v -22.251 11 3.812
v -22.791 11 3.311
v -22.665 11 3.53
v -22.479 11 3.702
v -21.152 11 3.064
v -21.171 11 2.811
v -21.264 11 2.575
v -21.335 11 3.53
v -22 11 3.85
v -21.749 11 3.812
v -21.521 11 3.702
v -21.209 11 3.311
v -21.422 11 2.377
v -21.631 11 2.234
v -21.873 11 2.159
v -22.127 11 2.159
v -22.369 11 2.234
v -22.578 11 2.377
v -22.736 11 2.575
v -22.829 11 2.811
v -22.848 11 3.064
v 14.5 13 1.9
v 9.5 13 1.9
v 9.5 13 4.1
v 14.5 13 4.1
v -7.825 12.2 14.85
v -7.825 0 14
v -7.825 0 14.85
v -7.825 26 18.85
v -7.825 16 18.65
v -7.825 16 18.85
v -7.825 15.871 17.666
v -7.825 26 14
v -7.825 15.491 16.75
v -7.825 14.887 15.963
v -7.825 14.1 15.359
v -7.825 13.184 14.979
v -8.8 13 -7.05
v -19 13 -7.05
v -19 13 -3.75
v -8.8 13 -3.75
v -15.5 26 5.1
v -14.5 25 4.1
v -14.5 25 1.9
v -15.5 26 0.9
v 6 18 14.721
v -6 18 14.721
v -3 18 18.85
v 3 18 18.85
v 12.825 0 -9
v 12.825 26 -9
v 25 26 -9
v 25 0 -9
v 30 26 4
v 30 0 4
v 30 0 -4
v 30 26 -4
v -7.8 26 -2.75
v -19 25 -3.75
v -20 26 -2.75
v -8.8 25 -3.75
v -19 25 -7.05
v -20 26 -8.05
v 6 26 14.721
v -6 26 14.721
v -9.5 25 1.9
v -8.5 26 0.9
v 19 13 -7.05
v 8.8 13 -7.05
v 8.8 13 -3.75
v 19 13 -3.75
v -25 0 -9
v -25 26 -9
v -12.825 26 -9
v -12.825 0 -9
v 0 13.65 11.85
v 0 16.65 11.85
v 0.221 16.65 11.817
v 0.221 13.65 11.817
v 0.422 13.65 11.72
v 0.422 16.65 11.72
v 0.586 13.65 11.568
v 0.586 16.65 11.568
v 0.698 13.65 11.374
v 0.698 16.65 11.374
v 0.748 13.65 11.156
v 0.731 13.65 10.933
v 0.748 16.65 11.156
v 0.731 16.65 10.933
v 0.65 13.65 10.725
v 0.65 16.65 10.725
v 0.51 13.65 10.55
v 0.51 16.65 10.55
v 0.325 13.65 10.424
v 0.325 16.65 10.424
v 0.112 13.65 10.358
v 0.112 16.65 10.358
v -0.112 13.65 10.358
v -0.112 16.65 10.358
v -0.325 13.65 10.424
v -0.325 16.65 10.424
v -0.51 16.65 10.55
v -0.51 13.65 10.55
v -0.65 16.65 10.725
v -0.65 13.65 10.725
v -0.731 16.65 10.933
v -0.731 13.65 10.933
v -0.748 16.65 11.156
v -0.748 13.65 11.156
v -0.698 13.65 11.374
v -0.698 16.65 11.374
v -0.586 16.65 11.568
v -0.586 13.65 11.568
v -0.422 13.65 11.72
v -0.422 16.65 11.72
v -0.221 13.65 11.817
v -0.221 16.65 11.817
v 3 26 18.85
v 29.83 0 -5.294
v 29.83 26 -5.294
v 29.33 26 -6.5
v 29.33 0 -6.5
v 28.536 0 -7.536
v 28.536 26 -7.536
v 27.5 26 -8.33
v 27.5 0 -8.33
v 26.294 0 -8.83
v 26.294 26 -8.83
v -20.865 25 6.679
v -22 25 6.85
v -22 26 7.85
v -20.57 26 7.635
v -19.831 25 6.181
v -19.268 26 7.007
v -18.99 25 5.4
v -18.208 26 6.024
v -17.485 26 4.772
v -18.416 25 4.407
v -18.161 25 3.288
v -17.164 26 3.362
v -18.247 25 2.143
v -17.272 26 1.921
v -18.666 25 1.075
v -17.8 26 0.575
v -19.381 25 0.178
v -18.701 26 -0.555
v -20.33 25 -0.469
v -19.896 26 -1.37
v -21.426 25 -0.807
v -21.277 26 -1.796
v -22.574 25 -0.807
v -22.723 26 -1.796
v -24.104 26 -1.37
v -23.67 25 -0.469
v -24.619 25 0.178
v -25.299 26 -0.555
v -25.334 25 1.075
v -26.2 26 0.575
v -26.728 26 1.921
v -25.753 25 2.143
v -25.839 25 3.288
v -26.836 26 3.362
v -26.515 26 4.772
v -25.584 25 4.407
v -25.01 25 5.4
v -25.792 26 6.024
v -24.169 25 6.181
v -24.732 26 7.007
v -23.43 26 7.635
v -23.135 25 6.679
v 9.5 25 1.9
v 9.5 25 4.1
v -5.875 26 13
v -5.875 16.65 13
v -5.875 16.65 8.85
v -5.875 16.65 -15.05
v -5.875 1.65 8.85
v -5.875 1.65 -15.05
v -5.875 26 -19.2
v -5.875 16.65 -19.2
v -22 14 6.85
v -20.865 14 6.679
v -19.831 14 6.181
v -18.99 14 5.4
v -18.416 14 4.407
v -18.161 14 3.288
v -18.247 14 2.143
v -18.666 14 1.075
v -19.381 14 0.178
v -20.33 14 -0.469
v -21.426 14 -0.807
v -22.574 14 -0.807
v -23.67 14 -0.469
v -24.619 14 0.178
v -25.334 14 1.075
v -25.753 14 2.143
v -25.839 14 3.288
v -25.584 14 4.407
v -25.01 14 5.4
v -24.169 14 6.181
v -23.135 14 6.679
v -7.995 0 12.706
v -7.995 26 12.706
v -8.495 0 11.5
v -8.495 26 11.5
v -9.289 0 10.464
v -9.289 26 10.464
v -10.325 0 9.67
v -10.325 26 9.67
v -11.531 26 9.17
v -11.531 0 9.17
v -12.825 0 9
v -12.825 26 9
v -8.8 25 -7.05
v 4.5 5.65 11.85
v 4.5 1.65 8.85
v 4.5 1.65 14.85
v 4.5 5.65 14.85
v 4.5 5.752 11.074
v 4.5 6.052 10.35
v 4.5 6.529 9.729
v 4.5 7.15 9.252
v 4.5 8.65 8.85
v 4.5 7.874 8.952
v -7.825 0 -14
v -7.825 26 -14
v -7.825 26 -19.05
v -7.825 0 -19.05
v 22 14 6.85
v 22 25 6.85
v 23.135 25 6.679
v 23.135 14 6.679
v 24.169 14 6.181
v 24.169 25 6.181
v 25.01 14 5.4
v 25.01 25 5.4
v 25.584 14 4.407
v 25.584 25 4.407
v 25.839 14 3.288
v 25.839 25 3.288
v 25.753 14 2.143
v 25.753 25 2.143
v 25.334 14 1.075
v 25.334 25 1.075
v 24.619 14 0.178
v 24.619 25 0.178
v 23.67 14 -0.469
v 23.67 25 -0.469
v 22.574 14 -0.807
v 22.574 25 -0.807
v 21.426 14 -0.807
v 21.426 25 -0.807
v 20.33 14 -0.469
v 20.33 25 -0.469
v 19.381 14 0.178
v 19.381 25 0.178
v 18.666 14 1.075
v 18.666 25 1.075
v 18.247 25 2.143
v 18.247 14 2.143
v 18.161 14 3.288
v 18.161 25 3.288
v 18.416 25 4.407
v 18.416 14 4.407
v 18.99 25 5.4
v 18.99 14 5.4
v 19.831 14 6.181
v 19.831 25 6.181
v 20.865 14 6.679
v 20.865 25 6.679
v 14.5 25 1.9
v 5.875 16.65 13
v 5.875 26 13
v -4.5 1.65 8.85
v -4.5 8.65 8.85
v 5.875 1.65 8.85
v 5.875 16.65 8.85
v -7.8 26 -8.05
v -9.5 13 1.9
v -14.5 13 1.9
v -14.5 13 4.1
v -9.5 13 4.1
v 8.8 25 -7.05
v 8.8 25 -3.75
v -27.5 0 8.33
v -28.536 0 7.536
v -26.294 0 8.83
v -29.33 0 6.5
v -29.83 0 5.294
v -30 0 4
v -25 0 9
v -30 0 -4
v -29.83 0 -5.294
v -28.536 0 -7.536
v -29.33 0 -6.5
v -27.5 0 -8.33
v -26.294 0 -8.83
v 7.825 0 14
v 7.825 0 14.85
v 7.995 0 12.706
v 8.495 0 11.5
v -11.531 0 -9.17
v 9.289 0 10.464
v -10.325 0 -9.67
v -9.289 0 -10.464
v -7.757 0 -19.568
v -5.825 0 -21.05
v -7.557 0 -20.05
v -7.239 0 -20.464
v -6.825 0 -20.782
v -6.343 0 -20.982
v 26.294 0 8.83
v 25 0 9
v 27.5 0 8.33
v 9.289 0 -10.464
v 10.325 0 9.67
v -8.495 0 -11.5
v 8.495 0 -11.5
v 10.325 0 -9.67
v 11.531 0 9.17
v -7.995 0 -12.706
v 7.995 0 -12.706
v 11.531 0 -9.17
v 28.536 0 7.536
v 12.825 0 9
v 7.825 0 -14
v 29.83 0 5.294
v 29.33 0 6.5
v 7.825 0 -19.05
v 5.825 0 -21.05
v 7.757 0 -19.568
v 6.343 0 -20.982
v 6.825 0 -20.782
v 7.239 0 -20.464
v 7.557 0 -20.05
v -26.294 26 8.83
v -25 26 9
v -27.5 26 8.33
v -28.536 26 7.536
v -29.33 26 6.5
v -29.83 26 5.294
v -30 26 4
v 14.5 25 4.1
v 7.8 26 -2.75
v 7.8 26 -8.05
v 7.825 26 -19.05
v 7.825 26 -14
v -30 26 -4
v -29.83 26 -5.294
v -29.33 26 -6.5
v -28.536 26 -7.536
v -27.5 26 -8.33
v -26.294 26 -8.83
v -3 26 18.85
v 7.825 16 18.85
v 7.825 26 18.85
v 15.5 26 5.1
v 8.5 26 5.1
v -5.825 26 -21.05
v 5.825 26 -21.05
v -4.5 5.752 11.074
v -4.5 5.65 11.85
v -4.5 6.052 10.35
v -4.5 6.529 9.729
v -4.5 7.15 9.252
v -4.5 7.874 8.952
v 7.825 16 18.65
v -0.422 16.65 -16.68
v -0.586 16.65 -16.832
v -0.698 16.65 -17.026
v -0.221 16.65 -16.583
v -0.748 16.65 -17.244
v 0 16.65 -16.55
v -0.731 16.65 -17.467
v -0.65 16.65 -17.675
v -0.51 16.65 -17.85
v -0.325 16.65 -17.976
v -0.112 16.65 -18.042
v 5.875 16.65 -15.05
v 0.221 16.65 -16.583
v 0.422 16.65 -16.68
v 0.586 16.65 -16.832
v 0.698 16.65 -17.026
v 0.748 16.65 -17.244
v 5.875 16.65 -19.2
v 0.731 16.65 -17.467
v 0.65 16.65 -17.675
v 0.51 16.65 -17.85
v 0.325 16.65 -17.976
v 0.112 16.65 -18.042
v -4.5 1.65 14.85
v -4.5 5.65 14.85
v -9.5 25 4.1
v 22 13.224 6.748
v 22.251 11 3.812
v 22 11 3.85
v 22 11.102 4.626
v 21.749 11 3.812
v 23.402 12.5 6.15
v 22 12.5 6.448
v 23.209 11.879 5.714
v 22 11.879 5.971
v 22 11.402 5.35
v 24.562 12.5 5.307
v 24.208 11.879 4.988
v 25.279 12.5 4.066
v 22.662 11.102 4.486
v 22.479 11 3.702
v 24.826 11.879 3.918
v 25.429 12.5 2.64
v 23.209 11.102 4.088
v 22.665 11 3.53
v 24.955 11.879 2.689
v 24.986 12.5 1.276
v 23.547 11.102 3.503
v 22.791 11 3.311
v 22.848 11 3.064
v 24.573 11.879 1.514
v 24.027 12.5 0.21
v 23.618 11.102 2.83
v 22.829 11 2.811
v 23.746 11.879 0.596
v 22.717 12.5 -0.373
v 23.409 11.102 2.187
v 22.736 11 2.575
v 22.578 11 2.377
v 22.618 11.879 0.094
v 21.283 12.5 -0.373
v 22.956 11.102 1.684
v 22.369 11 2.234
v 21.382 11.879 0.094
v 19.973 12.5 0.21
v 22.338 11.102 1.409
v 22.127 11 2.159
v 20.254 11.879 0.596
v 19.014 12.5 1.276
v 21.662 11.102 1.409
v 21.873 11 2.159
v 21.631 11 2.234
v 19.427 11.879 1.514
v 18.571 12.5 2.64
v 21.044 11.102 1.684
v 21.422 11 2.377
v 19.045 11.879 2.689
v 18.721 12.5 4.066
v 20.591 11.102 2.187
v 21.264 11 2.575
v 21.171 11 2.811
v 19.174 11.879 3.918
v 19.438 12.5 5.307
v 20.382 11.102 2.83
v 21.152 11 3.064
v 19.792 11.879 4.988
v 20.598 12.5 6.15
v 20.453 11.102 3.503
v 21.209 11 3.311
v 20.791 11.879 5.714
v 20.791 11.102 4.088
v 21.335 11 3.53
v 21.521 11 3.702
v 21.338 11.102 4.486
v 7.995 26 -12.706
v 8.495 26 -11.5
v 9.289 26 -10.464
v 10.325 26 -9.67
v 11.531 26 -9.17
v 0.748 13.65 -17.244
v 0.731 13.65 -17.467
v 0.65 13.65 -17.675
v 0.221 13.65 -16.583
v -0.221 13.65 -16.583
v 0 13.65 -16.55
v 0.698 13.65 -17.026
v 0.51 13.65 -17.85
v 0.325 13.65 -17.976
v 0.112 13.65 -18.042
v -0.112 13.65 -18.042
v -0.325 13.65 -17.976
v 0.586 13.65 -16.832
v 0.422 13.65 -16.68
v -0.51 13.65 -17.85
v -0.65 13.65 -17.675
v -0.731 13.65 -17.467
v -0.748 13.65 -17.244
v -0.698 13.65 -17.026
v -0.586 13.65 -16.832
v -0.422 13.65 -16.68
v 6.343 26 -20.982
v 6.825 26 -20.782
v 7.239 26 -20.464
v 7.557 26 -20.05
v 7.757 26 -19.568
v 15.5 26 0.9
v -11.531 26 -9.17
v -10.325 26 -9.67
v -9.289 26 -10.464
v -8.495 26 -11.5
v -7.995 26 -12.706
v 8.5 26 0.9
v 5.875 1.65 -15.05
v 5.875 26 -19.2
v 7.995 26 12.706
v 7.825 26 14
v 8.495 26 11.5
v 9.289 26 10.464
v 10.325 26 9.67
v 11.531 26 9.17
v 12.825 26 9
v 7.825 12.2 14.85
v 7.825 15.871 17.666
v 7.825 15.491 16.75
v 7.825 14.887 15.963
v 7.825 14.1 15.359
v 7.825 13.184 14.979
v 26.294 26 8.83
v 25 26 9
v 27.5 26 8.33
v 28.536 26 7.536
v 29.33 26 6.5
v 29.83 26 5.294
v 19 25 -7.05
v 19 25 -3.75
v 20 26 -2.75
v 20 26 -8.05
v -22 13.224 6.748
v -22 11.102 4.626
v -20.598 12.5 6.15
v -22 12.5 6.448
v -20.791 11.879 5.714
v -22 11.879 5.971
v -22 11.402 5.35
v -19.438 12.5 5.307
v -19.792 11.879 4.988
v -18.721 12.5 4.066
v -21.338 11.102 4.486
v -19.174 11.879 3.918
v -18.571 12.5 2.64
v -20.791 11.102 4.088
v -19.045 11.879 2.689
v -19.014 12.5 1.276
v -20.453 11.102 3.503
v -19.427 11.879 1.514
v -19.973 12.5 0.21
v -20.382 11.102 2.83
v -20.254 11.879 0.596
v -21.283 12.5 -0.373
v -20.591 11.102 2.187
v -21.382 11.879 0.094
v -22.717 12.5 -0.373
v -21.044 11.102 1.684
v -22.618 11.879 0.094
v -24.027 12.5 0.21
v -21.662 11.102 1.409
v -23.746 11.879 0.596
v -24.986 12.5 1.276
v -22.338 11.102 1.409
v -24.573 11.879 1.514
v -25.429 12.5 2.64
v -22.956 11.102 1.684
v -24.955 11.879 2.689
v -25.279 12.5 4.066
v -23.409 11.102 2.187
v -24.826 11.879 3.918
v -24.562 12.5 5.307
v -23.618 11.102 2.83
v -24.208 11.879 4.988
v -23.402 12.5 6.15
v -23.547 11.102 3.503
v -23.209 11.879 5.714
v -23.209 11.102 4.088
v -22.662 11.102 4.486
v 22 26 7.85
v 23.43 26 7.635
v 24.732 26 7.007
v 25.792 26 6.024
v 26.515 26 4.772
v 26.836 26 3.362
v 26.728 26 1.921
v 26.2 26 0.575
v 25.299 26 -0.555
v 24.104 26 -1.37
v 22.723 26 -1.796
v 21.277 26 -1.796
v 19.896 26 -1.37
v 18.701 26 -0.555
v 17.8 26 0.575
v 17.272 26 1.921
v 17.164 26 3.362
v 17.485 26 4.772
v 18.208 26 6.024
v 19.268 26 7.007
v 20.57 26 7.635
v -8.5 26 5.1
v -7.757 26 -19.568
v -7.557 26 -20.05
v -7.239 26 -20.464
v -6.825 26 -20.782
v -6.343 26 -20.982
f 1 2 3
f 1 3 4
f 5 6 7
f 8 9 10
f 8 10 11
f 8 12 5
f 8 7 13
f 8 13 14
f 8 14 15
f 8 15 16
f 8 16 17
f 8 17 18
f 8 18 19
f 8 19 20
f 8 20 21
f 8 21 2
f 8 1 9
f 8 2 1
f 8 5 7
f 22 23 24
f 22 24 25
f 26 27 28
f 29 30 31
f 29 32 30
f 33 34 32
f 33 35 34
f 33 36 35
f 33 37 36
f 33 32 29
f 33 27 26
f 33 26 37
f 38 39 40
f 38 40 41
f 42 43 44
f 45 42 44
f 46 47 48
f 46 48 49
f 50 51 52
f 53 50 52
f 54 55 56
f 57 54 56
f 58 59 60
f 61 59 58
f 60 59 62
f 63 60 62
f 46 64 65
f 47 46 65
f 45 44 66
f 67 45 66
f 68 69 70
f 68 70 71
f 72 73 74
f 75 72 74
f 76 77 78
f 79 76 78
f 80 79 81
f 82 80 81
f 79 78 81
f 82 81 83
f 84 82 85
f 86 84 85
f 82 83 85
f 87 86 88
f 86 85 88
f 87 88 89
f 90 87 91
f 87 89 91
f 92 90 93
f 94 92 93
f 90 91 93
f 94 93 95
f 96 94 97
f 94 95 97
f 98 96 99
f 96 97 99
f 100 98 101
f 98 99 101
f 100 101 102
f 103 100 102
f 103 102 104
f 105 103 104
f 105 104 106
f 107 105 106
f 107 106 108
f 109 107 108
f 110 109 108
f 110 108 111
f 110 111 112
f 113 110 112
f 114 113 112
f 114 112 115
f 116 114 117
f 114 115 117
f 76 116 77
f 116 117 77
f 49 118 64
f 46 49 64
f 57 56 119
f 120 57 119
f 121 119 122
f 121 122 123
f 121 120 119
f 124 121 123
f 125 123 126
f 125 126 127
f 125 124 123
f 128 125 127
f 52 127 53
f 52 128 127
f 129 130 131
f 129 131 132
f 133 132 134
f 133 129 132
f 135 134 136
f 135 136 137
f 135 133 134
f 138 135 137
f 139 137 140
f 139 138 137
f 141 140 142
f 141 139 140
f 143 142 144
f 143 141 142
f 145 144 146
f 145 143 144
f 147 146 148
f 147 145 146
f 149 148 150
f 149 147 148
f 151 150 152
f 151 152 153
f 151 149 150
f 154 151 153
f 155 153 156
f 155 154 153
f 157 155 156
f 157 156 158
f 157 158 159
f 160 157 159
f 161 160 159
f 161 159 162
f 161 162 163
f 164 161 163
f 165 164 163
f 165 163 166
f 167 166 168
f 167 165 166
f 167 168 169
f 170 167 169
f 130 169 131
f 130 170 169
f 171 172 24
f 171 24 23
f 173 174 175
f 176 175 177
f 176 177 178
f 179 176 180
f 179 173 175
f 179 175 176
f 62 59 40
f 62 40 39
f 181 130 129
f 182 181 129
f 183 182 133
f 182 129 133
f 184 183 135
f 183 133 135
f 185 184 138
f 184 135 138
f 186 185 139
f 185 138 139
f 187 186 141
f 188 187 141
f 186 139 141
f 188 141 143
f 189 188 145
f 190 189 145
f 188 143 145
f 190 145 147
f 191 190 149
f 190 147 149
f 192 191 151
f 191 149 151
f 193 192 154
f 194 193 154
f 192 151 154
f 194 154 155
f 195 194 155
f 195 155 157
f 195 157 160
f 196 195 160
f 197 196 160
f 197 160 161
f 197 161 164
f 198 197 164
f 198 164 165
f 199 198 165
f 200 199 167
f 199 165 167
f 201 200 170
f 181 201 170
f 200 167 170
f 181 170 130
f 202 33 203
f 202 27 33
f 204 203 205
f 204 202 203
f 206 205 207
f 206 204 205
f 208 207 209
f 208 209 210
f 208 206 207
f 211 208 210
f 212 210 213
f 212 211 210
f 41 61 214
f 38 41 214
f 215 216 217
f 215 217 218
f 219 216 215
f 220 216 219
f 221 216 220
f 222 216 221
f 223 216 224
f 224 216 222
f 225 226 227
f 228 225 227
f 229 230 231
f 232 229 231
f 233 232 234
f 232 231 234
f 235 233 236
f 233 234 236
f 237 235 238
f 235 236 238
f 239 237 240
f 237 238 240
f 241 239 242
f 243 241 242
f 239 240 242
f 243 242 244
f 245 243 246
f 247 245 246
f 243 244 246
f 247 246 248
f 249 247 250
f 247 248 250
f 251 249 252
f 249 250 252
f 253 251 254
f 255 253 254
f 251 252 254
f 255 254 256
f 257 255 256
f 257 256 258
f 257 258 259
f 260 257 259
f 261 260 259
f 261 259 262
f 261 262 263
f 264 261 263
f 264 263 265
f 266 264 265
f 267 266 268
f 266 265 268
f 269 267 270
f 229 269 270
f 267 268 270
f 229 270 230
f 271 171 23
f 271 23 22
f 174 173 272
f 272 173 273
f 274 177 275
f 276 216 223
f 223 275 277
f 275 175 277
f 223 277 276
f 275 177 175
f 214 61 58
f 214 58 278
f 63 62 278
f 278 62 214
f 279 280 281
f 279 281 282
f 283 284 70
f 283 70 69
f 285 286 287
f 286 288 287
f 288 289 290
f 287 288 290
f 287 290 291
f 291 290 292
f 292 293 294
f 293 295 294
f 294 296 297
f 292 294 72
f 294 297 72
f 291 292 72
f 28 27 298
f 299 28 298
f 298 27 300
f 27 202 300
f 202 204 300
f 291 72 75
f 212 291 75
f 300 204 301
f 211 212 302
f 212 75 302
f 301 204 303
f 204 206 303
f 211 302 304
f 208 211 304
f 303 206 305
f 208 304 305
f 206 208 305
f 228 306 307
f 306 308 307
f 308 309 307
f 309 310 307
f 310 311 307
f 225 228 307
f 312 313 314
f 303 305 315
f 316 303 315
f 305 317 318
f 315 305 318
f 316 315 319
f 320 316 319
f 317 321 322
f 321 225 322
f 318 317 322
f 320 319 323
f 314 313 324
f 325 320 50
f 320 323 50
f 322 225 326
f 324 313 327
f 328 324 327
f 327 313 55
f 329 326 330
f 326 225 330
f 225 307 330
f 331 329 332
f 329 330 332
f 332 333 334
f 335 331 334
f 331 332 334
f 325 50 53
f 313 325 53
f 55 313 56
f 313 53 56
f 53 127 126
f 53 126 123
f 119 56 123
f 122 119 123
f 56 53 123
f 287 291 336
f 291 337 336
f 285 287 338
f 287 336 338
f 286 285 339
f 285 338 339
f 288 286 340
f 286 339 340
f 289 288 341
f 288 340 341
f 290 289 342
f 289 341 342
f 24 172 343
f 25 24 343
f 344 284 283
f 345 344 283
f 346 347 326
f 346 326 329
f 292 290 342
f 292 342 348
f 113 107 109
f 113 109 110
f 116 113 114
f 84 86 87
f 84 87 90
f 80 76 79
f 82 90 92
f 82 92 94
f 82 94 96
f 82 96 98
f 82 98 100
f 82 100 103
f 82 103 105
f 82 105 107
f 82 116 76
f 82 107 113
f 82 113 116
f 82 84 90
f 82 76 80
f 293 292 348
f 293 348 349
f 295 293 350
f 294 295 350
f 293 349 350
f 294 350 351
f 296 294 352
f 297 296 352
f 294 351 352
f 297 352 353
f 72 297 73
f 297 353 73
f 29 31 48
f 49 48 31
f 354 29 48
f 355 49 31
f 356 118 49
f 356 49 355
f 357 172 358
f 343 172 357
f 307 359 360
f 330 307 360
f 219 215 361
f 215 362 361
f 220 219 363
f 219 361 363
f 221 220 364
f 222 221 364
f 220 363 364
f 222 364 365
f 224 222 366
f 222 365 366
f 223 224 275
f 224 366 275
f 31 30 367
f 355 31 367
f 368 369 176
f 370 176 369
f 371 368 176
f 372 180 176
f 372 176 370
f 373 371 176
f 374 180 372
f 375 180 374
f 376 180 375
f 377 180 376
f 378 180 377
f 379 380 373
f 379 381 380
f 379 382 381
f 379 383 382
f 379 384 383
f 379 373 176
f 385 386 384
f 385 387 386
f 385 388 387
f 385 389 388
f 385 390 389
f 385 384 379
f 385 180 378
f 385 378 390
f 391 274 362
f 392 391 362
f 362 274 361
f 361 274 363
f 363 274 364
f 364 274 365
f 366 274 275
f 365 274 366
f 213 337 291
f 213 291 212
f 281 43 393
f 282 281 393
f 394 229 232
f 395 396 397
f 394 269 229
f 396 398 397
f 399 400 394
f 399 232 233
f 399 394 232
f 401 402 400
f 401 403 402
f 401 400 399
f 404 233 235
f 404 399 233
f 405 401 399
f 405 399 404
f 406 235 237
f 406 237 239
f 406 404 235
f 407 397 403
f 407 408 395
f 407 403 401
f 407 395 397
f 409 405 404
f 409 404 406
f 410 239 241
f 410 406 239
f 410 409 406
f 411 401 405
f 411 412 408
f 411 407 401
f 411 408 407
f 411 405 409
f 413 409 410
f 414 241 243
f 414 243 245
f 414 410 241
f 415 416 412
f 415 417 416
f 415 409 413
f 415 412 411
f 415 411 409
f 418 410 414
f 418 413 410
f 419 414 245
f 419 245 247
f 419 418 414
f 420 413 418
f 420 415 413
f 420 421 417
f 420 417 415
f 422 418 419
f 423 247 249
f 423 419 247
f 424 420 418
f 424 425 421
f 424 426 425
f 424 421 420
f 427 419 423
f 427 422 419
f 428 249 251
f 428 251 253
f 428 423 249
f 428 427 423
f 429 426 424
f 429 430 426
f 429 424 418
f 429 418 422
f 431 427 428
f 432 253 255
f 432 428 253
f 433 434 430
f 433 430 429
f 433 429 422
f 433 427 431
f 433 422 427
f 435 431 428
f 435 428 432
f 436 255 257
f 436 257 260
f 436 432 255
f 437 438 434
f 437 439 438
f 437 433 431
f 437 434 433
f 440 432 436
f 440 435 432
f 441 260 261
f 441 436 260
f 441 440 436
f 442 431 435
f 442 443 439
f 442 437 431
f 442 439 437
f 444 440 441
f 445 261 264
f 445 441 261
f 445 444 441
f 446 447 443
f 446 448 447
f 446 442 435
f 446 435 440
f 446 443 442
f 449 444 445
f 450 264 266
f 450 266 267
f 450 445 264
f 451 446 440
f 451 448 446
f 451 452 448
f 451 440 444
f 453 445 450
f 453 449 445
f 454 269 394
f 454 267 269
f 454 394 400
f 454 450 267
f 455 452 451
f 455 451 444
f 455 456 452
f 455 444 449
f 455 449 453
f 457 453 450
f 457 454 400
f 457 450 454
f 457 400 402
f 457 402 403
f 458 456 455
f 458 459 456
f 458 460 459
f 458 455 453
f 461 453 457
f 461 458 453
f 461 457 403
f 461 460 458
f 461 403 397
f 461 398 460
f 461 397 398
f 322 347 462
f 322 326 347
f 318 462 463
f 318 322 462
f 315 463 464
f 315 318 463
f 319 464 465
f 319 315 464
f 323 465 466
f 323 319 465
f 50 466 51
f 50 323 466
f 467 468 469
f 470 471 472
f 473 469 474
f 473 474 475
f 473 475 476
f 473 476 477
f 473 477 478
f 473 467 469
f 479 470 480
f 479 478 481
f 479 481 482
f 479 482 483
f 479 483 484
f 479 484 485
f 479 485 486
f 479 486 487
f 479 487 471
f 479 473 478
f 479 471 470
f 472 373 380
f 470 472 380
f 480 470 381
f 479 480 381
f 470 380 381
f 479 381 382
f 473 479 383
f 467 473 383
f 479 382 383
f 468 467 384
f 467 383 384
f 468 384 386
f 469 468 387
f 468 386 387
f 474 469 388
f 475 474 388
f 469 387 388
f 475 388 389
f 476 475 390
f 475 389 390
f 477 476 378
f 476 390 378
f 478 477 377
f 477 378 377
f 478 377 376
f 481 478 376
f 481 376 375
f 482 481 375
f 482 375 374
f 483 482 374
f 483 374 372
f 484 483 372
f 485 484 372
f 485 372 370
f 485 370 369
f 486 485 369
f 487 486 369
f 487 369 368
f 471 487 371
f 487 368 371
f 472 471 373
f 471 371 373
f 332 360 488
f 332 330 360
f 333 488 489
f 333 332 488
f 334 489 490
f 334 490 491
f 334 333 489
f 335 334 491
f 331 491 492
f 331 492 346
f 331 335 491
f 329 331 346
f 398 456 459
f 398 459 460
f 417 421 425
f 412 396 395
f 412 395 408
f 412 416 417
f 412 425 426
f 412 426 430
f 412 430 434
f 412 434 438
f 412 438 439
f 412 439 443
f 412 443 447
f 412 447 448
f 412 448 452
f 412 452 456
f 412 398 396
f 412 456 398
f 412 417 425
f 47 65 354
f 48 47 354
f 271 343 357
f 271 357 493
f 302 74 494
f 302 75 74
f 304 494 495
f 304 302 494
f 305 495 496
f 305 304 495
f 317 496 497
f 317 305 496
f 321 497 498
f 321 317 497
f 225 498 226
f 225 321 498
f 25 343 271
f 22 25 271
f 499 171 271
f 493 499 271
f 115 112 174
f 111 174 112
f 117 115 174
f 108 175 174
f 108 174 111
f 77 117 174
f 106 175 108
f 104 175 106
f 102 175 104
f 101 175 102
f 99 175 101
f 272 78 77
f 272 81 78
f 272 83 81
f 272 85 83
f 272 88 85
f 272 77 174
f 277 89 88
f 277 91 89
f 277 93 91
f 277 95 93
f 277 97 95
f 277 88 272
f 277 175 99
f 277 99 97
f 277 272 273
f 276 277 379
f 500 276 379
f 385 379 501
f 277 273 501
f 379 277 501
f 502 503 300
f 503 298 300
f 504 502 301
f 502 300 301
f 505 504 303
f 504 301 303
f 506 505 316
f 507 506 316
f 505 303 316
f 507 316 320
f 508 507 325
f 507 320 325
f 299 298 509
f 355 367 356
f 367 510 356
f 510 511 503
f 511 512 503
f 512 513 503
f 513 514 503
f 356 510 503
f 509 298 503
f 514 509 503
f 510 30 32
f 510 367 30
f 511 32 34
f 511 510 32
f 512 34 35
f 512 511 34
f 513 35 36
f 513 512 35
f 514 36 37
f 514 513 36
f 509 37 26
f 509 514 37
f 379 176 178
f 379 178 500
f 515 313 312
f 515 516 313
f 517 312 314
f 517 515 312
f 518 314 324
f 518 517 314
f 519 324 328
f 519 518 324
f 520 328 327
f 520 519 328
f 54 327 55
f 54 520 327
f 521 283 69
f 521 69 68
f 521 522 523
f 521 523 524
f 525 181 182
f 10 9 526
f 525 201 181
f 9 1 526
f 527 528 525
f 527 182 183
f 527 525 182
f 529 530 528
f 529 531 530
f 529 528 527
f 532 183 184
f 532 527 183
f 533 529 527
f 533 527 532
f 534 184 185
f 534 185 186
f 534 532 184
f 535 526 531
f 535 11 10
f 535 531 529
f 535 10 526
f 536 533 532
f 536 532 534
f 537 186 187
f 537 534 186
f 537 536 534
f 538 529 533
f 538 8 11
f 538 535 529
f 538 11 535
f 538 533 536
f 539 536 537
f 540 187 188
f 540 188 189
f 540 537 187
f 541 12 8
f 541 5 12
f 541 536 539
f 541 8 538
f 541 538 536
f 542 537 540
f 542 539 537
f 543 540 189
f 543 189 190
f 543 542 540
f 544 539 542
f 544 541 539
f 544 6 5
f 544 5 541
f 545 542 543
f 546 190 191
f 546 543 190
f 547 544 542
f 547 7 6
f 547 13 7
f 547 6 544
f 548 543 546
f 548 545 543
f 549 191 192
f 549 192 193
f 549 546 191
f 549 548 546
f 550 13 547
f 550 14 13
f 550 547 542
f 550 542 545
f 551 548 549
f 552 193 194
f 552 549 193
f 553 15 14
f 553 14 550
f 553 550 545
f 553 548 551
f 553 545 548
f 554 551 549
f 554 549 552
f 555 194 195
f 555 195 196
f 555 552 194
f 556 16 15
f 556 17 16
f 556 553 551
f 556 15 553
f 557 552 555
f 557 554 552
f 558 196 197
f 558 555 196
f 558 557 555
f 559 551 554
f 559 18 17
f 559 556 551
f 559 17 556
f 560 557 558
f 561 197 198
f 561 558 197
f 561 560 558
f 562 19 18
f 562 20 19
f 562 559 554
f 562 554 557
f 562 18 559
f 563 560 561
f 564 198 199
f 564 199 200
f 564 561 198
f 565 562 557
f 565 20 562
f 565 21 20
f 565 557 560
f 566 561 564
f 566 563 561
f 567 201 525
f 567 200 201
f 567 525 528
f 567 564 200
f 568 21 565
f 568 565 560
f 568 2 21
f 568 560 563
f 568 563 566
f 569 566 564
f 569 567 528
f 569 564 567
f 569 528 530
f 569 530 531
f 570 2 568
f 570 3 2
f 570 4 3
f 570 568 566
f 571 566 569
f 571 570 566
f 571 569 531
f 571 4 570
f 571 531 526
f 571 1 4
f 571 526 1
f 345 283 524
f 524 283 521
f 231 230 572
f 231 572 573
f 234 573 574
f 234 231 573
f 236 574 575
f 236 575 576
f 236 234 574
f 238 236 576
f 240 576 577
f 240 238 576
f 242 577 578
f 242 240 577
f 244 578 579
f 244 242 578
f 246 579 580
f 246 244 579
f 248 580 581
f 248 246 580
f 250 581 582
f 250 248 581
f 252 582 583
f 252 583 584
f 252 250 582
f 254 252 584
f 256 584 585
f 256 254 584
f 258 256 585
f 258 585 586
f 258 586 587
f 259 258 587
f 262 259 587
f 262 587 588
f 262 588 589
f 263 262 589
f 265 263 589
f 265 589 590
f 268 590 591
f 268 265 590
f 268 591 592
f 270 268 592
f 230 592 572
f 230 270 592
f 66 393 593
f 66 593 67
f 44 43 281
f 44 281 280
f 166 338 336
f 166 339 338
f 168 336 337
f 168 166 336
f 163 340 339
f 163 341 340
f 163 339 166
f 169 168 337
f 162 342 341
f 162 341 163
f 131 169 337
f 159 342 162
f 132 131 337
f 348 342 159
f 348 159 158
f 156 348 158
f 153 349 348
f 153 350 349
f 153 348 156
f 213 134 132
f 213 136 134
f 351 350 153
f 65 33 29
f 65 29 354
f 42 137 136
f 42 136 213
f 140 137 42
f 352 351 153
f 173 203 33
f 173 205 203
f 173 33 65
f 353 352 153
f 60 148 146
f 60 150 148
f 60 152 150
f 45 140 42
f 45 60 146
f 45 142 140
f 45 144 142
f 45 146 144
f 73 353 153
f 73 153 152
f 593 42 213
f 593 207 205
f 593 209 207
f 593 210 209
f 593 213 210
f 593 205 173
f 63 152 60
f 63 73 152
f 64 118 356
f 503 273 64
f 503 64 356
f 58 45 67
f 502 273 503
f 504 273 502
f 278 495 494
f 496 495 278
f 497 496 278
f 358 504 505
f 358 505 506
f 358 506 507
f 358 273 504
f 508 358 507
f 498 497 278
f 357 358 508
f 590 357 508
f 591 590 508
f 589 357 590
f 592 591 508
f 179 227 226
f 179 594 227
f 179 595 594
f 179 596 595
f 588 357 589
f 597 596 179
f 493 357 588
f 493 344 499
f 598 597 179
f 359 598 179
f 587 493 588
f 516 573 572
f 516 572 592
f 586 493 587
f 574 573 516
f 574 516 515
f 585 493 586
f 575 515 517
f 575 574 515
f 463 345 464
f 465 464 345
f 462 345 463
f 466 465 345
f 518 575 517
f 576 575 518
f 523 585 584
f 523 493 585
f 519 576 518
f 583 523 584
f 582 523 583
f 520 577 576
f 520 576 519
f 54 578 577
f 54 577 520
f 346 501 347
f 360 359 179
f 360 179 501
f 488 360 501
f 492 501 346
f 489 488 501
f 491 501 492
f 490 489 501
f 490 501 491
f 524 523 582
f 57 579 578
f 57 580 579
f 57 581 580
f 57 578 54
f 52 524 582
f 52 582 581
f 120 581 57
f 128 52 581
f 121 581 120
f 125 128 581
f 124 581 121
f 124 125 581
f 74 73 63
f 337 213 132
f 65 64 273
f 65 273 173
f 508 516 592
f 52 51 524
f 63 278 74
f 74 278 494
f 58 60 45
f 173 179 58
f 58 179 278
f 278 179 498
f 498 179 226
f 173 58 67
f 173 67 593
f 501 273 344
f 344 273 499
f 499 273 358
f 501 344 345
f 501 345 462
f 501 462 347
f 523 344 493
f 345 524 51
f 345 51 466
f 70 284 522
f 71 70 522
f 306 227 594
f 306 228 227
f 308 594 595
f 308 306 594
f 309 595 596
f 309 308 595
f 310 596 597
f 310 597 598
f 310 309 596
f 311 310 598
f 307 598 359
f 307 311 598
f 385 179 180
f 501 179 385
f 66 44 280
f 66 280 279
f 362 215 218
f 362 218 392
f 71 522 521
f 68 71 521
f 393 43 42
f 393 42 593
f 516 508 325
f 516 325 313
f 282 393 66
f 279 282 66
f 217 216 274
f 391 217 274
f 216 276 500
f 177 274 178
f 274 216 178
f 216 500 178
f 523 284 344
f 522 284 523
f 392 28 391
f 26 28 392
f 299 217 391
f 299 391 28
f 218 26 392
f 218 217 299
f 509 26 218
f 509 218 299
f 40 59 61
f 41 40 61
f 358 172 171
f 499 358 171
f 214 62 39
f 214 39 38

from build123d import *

# Parameters (mm, degrees)
SKETCH1_W             = 60
SKETCH1_H             = 18
BOSS_EXTRUDE1_DEPTH   = 26
SKETCH2_R             = 3.85
EYESHAFT_HOLES_DEPTH  = 15
EYESHAFT_FILLET_R     = 3
SKETCH5_W             = 5
SKETCH5_H             = 2.2
FRONT_LEG_HOLES_DEPTH = 13
SKETCH7_W             = 10.2
SKETCH7_H             = 3.3
BACK_LEGS_DEPTH       = 13
SKETCH18_W            = 15.65
SKETCH18_H            = 35.9
SERVO_BLOCK_DEPTH     = 26
SKETCH19_W            = 11.75
SKETCH19_H            = 32.2
SERVO_ARMS_DEPTH      = 9.35
SKETCH20_W            = 11.75
SKETCH20_H            = 23.9
CUT_EXTRUDE10_DEPTH   = 15
FILLET4_R             = 5
CHAMFER1_SIZE         = 1
SKETCH21_W            = 9
SKETCH21_H            = 4
CUT_EXTRUDE11_DEPTH   = 15
FILLET5_R             = 3
SKETCH22_R            = 0.75
CUT_EXTRUDE12_DEPTH   = 3
FILLET6_R             = 5
SKETCH23_W            = 15.65
SKETCH23_H            = 10
BOSS_EXTRUDE3_DEPTH   = 4
DOVE_TAIL_DEPTH       = 8
FILLET8_R             = 3.8
FILLET9_R             = 2


with BuildPart() as part:
    # Sketch1 → Boss-Extrude1 (new body)
    with BuildSketch(Plane(origin=(0, 0, 0), x_dir=(1, 0, 0), z_dir=(0, 1, 0))):
        Rectangle(SKETCH1_W, SKETCH1_H)
    extrude(amount=BOSS_EXTRUDE1_DEPTH)

    # Sketch2 → Eyeshaft holes (cut)
    with BuildSketch(Plane(origin=(0, 26, 0), x_dir=(1, 0, 0), z_dir=(0, 1, 0))):
        with Locations(Location((-22, -3, 0), (0, 0, 270))):
            Circle(SKETCH2_R)
        with Locations(Location((22, -3, 0), (0, 0, 270))):
            Circle(SKETCH2_R)
    extrude(amount=-EYESHAFT_HOLES_DEPTH, mode=Mode.SUBTRACT)

    # Eyeshaft Fillet
    eyeshaft_fillet_edges = [part.edges().sort_by_distance(p)[0] for p in [
        (-22, 11, -0.85),
        (22, 11, -0.85),
    ]]
    fillet(eyeshaft_fillet_edges, radius=EYESHAFT_FILLET_R)

    # Sketch5 → Front leg holes (cut)
    with BuildSketch(Plane(origin=(0, 26, 0), x_dir=(1, 0, 0), z_dir=(0, 1, 0))):
        with Locations((-12, -3)):
            Rectangle(SKETCH5_W, SKETCH5_H)
        with Locations((12, -3)):
            Rectangle(SKETCH5_W, SKETCH5_H)
    extrude(amount=-FRONT_LEG_HOLES_DEPTH, mode=Mode.SUBTRACT)

    # Sketch7 → Back Legs (cut)
    with BuildSketch(Plane(origin=(0, 26, 0), x_dir=(1, 0, 0), z_dir=(0, 1, 0))):
        with Locations((-13.9, 5.4)):
            Rectangle(SKETCH7_W, SKETCH7_H)
        with Locations((13.9, 5.4)):
            Rectangle(SKETCH7_W, SKETCH7_H)
    extrude(amount=-BACK_LEGS_DEPTH, mode=Mode.SUBTRACT)

    # Sketch18 → Servo Block (add)
    with BuildSketch(Plane(origin=(0, 26, 0), x_dir=(1, 0, 0), z_dir=(0, 1, 0))):
        with Locations((0, 3.1)):
            Rectangle(SKETCH18_W, SKETCH18_H)
    extrude(amount=-SERVO_BLOCK_DEPTH)

    # Sketch19 → Servo Arms (cut)
    with BuildSketch(Plane(origin=(0, 26, 0), x_dir=(1, 0, 0), z_dir=(0, 1, 0))):
        with Locations((0, 3.1)):
            Rectangle(SKETCH19_W, SKETCH19_H)
    extrude(amount=-SERVO_ARMS_DEPTH, mode=Mode.SUBTRACT)

    # Sketch20 → Cut-Extrude10 (cut)
    with BuildSketch(Plane(origin=(0, 16.65, 0), x_dir=(1, 0, 0), z_dir=(0, 1, 0))):
        with Locations((0, 3.1)):
            Rectangle(SKETCH20_W, SKETCH20_H)
    extrude(amount=-CUT_EXTRUDE10_DEPTH, mode=Mode.SUBTRACT)

    # Fillet4
    fillet4_edges = [part.edges().sort_by_distance(p)[0] for p in [
        (30, 13, 9),
        (-30, 13, 9),
        (-30, 13, -9),
        (30, 13, -9),
    ]]
    fillet(fillet4_edges, radius=FILLET4_R)

    # Chamfer1
    chamfer1_edges = [part.edges().sort_by_distance(p)[0] for p in [
        (-22, 26, -0.85),
        (22, 26, -0.85),
        (-9.5, 26, 3),
        (-12, 26, 1.9),
        (-14.5, 26, 3),
        (-12, 26, 4.1),
        (14.5, 26, 3),
        (12, 26, 1.9),
        (9.5, 26, 3),
        (12, 26, 4.1),
        (-19, 26, -5.4),
        (-13.9, 26, -3.75),
        (-8.8, 26, -5.4),
        (-13.9, 26, -7.05),
        (8.8, 26, -5.4),
        (13.9, 26, -3.75),
        (19, 26, -5.4),
        (13.9, 26, -7.05),
    ]]
    chamfer(chamfer1_edges, length=CHAMFER1_SIZE)

    # Sketch21 → Cut-Extrude11 (cut)
    with BuildSketch(Plane(origin=(0, 0, 8.85), x_dir=(-1, 0, 0), z_dir=(0, 0, -1))):
        with Locations((0, 3.65)):
            Rectangle(SKETCH21_W, SKETCH21_H)
    extrude(amount=-CUT_EXTRUDE11_DEPTH, mode=Mode.SUBTRACT)

    # Fillet5
    fillet5_edges = [part.edges().sort_by_distance(p)[0] for p in [
        (0, 5.65, 8.85),
    ]]
    fillet(fillet5_edges, radius=FILLET5_R)

    # Sketch22 → Cut-Extrude12 (cut)
    with BuildSketch(Plane(origin=(0, 16.65, 0), x_dir=(1, 0, 0), z_dir=(0, 1, 0))):
        with Locations(Location((0, 17.3, 0), (0, 0, 270))):
            Circle(SKETCH22_R)
        with Locations(Location((0, -11.1, 0), (0, 0, 270))):
            Circle(SKETCH22_R)
    extrude(amount=-CUT_EXTRUDE12_DEPTH, mode=Mode.SUBTRACT)

    # Fillet6
    fillet6_edges = [part.edges().sort_by_distance(p)[0] for p in [
        (-7.825, 13, -9),
        (-7.825, 13, 9),
        (7.825, 13, -9),
        (7.825, 13, 9),
    ]]
    fillet(fillet6_edges, radius=FILLET6_R)

    # Sketch23 → Boss-Extrude3 (add)
    with BuildSketch(Plane.XY.offset(14.85)):
        with Locations((0, 21)):
            Rectangle(SKETCH23_W, SKETCH23_H)
    extrude(amount=BOSS_EXTRUDE3_DEPTH)

    # Sketch24 → Dove tail (cut)
    with BuildSketch(Plane(origin=(0, 26, 0), x_dir=(1, 0, 0), z_dir=(0, 1, 0))):
        Polygon((6, -14.720854239), (-6, -14.720854239), (-3, -18.85), (3, -18.85), align=None)
    extrude(amount=-DOVE_TAIL_DEPTH, mode=Mode.SUBTRACT)

    # Fillet8
    fillet8_edges = [part.edges().sort_by_distance(p)[0] for p in [
        (0, 16, 14.85),
    ]]
    fillet(fillet8_edges, radius=FILLET8_R)

    # Fillet9
    fillet9_edges = [part.edges().sort_by_distance(p)[0] for p in [
        (7.825, 13, -21.05),
        (-7.825, 13, -21.05),
    ]]
    fillet(fillet9_edges, radius=FILLET9_R)


solid = part.part
